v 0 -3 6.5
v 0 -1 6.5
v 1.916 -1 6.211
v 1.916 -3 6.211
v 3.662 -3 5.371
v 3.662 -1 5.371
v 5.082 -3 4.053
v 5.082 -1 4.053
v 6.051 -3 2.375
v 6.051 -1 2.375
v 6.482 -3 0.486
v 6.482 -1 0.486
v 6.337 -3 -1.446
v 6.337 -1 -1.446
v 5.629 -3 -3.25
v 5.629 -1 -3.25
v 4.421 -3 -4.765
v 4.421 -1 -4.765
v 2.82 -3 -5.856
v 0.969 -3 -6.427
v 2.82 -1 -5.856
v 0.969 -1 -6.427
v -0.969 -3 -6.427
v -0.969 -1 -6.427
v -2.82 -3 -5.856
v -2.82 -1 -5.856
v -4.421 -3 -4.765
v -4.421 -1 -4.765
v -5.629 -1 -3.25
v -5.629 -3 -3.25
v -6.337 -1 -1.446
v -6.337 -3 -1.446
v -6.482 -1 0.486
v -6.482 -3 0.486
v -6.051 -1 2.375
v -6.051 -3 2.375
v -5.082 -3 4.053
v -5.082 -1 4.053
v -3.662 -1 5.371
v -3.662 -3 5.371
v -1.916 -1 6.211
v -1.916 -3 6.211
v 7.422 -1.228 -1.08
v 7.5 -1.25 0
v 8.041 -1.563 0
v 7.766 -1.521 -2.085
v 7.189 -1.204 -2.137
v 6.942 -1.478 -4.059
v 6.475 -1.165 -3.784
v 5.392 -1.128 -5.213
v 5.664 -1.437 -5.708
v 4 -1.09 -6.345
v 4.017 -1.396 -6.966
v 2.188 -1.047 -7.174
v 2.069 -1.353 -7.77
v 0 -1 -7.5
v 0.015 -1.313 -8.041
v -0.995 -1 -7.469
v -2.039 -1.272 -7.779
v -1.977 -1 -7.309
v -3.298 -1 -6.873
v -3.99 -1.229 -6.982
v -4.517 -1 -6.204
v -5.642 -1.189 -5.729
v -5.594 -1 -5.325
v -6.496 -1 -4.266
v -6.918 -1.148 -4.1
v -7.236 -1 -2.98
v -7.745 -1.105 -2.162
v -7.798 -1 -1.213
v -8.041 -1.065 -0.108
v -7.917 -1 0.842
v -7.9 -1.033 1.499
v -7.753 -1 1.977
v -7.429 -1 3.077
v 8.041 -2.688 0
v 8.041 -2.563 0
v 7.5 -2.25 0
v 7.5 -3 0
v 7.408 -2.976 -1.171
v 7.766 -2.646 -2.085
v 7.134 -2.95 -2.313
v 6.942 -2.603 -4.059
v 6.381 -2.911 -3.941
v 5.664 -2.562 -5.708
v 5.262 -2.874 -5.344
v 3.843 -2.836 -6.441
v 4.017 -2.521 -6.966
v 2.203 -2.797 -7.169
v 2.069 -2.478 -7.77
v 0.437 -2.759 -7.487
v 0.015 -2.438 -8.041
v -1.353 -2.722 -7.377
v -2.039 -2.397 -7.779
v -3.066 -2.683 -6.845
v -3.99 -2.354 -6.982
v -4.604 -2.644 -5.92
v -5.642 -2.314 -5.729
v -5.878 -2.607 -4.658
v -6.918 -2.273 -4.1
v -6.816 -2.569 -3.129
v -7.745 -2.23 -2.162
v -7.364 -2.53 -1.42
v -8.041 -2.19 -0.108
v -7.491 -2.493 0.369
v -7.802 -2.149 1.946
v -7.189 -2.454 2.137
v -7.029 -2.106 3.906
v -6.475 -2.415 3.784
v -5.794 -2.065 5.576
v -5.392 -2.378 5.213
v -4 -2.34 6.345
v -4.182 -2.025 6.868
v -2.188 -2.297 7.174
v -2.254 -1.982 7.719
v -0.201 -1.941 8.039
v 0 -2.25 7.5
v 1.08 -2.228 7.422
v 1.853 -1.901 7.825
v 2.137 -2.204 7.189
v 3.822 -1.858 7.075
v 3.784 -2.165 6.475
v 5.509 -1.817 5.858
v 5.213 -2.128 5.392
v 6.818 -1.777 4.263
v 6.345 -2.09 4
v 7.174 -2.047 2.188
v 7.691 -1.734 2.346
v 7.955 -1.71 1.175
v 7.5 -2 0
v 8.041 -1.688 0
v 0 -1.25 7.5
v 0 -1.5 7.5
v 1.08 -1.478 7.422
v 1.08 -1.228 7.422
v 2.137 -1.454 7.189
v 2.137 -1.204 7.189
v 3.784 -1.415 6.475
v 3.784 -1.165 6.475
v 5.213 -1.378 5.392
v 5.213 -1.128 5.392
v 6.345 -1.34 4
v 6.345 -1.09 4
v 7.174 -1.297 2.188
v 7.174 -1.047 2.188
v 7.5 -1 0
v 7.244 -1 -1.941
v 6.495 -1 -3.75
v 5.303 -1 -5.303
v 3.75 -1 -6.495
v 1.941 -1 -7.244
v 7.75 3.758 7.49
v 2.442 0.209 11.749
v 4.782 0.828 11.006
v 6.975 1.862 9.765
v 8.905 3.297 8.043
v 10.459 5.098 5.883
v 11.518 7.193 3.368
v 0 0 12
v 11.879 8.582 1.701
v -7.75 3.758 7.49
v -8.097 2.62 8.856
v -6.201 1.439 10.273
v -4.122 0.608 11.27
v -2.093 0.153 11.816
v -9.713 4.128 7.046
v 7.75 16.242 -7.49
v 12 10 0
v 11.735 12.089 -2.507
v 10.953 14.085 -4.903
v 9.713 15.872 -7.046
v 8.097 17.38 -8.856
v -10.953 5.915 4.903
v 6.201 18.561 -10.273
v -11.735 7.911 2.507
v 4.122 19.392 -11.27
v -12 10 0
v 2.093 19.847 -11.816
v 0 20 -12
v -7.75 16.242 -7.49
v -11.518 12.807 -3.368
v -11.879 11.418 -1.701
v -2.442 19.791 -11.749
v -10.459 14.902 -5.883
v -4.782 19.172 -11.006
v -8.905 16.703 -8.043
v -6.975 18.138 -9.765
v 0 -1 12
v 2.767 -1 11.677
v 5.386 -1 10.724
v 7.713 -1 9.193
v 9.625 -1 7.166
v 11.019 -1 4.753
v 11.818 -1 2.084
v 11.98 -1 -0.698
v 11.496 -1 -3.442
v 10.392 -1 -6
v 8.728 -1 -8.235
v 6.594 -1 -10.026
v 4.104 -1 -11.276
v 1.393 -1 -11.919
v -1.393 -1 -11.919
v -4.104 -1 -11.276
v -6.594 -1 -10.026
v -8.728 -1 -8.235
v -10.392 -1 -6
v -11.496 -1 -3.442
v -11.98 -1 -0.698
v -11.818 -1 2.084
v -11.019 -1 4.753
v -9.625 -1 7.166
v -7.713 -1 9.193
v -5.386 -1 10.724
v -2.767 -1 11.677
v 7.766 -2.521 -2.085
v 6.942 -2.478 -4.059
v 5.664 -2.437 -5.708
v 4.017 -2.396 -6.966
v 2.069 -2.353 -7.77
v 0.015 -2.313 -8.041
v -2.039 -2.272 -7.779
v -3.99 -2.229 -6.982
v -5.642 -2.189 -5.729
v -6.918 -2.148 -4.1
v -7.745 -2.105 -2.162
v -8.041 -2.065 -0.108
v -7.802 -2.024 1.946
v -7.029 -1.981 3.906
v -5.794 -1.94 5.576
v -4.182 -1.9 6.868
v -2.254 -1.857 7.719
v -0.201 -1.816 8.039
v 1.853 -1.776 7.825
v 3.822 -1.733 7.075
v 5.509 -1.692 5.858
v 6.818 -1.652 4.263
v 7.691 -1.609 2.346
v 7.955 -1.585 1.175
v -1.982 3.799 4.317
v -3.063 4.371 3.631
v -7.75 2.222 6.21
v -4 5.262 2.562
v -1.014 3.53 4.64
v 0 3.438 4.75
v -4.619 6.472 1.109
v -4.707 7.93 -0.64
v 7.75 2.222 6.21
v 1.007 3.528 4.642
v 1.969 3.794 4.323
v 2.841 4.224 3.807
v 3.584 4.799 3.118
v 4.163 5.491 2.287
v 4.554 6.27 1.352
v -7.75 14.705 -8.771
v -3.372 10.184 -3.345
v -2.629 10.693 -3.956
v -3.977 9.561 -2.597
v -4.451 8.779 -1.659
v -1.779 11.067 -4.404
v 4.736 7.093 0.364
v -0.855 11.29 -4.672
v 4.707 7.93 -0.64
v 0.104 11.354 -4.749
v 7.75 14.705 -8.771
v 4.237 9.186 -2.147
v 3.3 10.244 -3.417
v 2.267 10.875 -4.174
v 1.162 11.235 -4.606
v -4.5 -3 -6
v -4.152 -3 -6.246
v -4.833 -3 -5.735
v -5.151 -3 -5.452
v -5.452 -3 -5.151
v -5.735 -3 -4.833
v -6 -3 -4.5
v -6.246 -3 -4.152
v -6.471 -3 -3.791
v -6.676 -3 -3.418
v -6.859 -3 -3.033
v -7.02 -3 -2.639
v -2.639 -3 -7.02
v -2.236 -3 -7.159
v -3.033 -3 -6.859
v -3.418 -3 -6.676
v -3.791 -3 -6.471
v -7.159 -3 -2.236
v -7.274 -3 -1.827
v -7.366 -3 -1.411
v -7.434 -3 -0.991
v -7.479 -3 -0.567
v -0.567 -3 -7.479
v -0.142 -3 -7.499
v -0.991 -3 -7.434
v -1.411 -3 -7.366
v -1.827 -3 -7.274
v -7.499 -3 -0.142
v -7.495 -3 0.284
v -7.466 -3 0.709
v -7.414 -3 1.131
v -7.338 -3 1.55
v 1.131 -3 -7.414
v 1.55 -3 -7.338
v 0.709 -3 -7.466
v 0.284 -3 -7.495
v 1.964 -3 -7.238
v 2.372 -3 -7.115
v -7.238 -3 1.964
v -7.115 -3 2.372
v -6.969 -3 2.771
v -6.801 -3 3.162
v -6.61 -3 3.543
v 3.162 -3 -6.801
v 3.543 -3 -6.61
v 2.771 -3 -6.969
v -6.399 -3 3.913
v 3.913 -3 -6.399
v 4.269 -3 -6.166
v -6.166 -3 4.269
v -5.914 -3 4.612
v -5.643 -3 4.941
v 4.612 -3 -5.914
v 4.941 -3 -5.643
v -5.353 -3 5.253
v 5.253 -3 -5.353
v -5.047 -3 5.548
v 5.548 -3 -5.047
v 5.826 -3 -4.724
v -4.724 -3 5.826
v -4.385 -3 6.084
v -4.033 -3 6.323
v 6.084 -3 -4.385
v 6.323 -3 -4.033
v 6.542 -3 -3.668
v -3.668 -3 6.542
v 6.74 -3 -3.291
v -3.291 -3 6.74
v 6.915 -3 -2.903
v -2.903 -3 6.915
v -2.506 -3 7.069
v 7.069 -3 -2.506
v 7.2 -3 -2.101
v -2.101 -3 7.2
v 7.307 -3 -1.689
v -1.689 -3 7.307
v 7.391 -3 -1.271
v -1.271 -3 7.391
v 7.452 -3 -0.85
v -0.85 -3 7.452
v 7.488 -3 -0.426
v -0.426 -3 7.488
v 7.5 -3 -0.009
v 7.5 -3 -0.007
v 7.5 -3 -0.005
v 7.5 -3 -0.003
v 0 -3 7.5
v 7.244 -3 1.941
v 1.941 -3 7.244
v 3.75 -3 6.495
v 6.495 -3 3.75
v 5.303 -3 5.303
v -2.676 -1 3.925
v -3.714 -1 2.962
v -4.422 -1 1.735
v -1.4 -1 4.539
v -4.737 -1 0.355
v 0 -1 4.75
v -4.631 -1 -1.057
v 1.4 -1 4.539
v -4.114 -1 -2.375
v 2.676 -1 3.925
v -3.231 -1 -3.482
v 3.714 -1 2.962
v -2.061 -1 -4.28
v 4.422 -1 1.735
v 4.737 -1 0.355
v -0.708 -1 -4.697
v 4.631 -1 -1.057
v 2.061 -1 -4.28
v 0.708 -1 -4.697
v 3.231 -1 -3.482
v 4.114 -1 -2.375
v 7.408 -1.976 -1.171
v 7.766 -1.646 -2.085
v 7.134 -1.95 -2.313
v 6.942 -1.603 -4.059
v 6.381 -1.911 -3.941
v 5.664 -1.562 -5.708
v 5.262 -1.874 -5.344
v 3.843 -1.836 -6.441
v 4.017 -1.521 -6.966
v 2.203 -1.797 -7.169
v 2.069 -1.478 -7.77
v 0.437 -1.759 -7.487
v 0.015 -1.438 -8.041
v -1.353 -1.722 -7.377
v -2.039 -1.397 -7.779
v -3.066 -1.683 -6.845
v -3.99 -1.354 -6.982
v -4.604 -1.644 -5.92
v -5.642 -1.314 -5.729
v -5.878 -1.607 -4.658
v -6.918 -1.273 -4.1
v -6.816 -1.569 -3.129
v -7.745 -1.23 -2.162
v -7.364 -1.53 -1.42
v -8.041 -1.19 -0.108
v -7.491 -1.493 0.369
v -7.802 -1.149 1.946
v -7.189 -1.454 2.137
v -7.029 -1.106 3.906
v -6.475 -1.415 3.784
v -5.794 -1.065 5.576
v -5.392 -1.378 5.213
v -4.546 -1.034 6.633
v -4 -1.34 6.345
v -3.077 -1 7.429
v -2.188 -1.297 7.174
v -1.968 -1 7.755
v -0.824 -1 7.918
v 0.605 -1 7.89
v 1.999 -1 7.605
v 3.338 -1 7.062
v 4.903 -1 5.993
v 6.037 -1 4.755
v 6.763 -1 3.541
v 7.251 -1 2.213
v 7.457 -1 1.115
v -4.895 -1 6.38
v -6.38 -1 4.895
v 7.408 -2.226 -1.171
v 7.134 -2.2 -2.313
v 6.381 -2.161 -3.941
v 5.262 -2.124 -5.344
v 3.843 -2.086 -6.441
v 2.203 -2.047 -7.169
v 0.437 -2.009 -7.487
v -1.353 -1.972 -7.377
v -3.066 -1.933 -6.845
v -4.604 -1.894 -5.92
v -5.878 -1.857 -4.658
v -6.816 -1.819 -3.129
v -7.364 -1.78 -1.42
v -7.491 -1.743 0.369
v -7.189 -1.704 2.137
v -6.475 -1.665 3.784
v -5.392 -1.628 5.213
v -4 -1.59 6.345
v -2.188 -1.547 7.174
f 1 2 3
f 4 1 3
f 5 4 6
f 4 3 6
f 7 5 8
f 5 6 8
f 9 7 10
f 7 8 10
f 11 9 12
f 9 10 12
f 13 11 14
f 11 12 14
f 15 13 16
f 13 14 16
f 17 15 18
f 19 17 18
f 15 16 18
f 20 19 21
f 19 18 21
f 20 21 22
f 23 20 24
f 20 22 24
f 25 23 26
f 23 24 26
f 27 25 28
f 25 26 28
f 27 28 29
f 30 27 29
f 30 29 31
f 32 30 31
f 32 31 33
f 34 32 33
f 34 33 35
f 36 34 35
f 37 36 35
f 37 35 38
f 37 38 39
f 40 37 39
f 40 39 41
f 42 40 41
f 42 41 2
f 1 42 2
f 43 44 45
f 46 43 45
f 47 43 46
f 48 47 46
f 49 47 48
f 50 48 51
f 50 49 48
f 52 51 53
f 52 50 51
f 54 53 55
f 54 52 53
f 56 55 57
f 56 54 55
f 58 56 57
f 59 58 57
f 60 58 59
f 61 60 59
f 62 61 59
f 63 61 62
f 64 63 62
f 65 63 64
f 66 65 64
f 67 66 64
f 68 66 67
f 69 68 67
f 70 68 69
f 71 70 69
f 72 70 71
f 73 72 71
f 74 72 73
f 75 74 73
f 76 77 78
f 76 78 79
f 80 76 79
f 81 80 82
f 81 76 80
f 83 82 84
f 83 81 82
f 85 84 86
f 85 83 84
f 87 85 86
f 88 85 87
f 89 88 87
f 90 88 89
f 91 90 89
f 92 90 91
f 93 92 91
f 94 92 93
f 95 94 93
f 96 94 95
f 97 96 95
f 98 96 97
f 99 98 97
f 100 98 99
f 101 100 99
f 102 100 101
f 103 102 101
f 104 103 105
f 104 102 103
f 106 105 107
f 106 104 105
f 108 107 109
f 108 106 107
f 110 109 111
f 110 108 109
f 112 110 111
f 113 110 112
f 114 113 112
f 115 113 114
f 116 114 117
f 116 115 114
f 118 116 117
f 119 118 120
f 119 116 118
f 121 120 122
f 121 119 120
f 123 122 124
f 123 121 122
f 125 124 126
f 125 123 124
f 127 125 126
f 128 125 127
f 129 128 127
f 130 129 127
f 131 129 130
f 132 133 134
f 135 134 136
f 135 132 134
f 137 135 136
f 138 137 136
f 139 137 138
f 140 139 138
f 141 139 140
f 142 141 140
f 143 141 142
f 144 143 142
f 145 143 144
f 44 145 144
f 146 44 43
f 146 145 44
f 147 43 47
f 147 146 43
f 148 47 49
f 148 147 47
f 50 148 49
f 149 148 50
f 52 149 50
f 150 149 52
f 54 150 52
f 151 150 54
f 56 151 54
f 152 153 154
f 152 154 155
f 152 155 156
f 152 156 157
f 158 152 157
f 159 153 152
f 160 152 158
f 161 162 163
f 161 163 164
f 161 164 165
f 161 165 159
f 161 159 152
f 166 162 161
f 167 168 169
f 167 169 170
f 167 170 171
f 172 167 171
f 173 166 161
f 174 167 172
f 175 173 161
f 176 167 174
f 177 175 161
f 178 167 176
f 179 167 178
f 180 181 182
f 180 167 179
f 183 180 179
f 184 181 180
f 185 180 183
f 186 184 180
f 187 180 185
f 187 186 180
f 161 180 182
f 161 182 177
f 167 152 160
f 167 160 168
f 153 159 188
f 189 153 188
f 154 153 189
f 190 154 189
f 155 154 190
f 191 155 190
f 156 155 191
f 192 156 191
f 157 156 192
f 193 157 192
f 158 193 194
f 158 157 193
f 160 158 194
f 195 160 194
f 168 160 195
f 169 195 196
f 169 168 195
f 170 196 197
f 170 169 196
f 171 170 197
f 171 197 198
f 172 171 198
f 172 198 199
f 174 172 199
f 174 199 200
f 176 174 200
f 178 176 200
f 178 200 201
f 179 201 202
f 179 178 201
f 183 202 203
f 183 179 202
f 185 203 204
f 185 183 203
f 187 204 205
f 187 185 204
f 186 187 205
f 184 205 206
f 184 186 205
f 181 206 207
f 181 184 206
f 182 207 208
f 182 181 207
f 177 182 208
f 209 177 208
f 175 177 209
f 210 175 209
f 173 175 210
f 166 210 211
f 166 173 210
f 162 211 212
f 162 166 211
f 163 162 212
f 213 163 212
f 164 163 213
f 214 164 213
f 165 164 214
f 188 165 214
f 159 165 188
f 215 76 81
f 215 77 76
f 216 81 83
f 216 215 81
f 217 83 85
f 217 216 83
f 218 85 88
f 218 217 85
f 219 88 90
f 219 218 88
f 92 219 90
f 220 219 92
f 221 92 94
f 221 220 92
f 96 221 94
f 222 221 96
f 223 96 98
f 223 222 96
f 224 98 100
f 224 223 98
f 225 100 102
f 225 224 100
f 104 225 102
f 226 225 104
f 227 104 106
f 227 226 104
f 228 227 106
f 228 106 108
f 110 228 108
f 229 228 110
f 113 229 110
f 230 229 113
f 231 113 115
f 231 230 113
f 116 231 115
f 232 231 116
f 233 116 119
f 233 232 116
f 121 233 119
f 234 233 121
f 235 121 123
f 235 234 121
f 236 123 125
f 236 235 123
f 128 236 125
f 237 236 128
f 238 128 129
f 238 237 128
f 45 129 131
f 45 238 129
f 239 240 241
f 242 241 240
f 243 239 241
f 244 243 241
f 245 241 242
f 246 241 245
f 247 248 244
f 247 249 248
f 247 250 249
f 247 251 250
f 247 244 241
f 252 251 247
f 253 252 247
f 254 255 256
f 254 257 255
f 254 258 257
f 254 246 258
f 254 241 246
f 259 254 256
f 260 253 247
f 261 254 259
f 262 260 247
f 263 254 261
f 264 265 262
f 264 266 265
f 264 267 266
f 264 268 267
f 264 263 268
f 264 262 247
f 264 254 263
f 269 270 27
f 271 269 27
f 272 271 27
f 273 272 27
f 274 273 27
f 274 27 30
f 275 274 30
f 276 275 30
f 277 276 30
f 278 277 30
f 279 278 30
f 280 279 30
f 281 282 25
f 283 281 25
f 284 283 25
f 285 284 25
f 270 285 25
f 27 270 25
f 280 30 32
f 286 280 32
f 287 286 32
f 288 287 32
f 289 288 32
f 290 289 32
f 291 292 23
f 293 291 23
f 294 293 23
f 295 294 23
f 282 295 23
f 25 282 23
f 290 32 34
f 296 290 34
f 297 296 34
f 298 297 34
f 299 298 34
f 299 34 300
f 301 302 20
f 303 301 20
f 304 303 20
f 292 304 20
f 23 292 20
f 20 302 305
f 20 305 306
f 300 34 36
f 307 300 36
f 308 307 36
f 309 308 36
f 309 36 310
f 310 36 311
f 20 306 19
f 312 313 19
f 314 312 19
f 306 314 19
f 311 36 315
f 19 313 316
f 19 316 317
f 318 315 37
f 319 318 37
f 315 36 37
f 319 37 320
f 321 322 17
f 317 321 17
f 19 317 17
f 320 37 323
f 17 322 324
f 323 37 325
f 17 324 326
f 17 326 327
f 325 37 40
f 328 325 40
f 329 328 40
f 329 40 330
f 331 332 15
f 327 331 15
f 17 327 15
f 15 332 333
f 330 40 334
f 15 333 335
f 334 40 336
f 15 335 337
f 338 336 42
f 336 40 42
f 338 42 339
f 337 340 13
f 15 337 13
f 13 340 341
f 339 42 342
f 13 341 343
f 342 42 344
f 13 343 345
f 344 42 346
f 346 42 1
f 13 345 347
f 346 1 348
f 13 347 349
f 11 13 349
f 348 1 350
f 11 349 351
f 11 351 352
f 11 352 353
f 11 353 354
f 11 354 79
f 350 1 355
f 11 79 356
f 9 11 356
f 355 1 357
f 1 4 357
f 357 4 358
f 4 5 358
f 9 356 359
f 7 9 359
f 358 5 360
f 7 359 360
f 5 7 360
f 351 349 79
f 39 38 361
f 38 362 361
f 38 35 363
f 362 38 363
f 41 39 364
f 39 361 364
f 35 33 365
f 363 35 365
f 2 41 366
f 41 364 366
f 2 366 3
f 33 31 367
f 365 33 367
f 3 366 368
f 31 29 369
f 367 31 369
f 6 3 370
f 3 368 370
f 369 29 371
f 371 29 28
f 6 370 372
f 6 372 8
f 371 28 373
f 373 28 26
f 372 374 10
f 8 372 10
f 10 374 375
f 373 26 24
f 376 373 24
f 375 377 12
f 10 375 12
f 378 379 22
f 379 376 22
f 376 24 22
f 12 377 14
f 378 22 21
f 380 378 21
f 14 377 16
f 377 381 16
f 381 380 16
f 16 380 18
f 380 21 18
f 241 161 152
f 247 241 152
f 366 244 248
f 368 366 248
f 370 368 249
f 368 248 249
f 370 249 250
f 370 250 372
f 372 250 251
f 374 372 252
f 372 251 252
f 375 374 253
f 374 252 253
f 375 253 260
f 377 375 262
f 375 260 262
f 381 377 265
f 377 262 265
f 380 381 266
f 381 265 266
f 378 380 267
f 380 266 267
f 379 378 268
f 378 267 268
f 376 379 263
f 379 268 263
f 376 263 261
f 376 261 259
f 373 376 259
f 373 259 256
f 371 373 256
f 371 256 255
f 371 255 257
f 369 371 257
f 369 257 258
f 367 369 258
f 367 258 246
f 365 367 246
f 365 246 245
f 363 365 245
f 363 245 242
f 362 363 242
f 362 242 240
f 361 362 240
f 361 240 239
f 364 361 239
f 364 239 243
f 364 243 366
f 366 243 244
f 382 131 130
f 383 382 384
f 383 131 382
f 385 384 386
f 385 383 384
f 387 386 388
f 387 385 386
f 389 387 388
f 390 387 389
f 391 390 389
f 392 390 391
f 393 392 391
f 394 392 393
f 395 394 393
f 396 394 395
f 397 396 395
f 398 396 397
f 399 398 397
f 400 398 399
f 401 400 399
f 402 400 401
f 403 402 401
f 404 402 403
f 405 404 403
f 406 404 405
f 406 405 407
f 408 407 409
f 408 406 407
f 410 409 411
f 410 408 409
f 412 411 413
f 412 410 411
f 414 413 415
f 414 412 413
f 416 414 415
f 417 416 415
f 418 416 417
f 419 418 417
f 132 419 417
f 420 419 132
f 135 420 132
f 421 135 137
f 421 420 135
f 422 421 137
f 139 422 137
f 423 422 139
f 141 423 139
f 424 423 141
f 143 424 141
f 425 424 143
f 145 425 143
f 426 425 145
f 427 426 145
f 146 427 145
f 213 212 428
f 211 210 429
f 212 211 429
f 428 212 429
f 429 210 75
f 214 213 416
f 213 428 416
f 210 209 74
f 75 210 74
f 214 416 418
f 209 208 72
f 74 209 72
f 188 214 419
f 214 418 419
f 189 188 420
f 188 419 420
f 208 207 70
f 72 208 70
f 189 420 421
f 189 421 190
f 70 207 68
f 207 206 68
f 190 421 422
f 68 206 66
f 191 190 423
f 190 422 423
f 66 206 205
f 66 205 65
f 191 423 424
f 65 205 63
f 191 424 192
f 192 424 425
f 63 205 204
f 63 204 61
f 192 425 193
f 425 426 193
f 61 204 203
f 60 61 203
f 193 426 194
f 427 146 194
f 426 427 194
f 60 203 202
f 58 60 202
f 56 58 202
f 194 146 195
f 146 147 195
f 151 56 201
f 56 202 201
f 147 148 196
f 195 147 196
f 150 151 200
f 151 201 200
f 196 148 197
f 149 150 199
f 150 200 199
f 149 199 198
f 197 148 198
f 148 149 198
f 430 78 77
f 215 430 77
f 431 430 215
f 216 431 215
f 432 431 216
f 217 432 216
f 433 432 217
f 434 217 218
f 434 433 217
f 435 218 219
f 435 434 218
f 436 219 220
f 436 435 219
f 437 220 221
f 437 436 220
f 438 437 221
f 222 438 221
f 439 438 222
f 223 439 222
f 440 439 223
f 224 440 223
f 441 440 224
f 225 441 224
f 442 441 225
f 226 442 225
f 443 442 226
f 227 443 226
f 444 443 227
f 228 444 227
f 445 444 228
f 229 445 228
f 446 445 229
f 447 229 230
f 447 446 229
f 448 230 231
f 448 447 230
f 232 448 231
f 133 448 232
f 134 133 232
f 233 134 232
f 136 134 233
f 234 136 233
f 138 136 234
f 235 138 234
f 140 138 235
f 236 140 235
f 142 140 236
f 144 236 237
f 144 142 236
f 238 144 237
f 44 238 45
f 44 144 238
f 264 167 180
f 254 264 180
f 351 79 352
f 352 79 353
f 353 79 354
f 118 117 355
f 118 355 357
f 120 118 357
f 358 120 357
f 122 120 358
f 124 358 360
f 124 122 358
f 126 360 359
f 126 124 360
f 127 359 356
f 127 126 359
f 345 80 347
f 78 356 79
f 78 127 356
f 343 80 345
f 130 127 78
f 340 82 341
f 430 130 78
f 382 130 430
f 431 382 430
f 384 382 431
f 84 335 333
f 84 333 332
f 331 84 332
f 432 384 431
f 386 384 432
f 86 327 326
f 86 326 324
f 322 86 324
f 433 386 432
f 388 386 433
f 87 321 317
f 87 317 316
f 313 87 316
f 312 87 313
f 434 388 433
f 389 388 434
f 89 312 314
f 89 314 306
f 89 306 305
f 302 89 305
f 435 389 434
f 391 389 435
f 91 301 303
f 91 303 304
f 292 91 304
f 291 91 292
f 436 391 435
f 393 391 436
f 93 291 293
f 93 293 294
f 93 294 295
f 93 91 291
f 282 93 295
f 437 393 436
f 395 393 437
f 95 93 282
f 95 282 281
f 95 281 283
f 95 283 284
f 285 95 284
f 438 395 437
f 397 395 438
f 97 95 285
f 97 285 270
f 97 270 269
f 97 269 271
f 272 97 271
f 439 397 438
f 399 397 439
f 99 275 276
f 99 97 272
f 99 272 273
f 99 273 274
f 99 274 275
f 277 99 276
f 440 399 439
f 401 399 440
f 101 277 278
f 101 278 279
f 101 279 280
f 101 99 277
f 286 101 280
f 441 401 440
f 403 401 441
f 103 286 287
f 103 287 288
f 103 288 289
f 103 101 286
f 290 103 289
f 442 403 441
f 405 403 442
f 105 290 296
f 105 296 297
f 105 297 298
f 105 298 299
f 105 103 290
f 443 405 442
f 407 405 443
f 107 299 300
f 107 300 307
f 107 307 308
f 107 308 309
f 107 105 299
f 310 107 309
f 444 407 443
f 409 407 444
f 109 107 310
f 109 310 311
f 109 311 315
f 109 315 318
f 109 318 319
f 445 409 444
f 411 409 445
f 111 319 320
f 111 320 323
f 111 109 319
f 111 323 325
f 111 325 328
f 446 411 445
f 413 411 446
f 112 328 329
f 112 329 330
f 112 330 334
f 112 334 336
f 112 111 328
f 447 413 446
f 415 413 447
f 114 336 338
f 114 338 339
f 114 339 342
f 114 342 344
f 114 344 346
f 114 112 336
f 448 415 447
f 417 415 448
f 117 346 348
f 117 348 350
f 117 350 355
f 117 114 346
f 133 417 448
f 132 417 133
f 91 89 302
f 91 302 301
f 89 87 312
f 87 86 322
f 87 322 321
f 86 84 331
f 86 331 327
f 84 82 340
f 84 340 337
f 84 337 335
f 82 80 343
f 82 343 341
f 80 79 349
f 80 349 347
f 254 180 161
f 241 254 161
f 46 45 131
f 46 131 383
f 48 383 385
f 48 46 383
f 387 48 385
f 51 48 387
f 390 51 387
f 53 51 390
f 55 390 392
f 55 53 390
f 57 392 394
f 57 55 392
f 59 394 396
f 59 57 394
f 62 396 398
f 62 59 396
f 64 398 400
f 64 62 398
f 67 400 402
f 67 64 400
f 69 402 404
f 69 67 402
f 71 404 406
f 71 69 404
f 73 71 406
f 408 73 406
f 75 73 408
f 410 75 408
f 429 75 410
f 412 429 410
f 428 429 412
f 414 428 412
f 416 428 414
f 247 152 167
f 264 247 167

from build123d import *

# Parameters (mm, degrees)
SKETCH2_R           = 12
SKETCH2_R_2         = 7.5
SKETCH2_R_3         = 6.5
SKETCH2_R_4         = 4.75
BOSS_EXTRUDE2_DEPTH = 1
SKETCH2_4_R         = 7.5
SKETCH2_4_R_2       = 6.5
BOSS_EXTRUDE3_DEPTH = 3
BOSS_EXTRUDE4_START = 20
SKETCH2_5_R         = 12
SKETCH2_5_R_2       = 4.75
BOSS_EXTRUDE4_DEPTH = 20
CUT_EXTRUDE1_START  = -12.0000001
CUT_EXTRUDE1_DEPTH  = 24.0000001
CUT_EXTRUDE5_DEPTH  = 2
SKETCH11_W          = 15.5
SKETCH11_H          = 2
CUT_EXTRUDE6_DEPTH  = 18
THREAD2_PITCH       = 1


# Read off the part's stored shape, not the designer's step: Cut-Extrude1
with BuildPart() as part:
    # Sketch2 → Boss-Extrude2 (new body)
    # profile 1 of 3: a face of its own
    with BuildSketch(Plane(origin=(0, 0, 0), x_dir=(1, 0, 0), z_dir=(0, 1, 0))):
        with Locations(Location((0, 0, 0), (0, 0, 270))):
            Circle(SKETCH2_R)
        Circle(SKETCH2_R_2, mode=Mode.SUBTRACT)
    # profile 2 of 3: a face of its own
    with BuildSketch(Plane(origin=(0, 0, 0), x_dir=(1, 0, 0), z_dir=(0, 1, 0))):
        Circle(SKETCH2_R_2)
        Circle(SKETCH2_R_3, mode=Mode.SUBTRACT)
    # profile 3 of 3: a face of its own
    with BuildSketch(Plane(origin=(0, 0, 0), x_dir=(1, 0, 0), z_dir=(0, 1, 0))):
        Circle(SKETCH2_R_3)
        with Locations(Location((0, 0, 0), (0, 0, 270))):
            Circle(SKETCH2_R_4, mode=Mode.SUBTRACT)
    extrude(amount=-BOSS_EXTRUDE2_DEPTH)

    # Sketch2<4> → Boss-Extrude3 (add)
    with BuildSketch(Plane(origin=(0, 0, 0), x_dir=(1, 0, 0), z_dir=(0, 1, 0))):
        with Locations(Location((0, 0, 0), (0, 0, 270))):
            Circle(SKETCH2_4_R)
        with Locations(Location((0, 0, 0), (0, 0, 270))):
            Circle(SKETCH2_4_R_2, mode=Mode.SUBTRACT)
    extrude(amount=-BOSS_EXTRUDE3_DEPTH)

    # Sketch2<5> → Boss-Extrude4 (add)
    with BuildSketch(Plane(origin=(0, 0, 0), x_dir=(1, 0, 0), z_dir=(0, 1, 0)).offset(BOSS_EXTRUDE4_START)):
        with Locations(Location((0, 0, 0), (0, 0, 270))):
            Circle(SKETCH2_5_R)
        with Locations(Location((0, 0, 0), (0, 0, 270))):
            Circle(SKETCH2_5_R_2, mode=Mode.SUBTRACT)
    extrude(amount=-BOSS_EXTRUDE4_DEPTH)

    # Cut-Extrude1 outline → Cut-Extrude1 (cut)
    with BuildSketch(Plane(origin=(0, 0, 0), x_dir=(0, 0, -1), z_dir=(1, 0, 0)).offset(CUT_EXTRUDE1_START)):
        Polygon((-12, 20), (-12, 0), (12, 20), align=None)
    extrude(amount=CUT_EXTRUDE1_DEPTH, mode=Mode.SUBTRACT)

    # Sketch10 → Cut-Extrude5 (cut)
    with BuildSketch(Plane(origin=(0, 5.901639344, 4.918032787), x_dir=(1, 0, 0), z_dir=(0, 0.768221279597376, 0.6401843996644798))):
        with BuildLine():
            Line((-4.75, 6.401843997), (-7.75, 6.401843997))
            Line((-7.75, 6.401843997), (-7.75, -3.348156003))
            Line((-7.75, -3.348156003), (7.75, -3.348156003))
            Line((7.75, -3.348156003), (7.75, 6.401843997))
            Line((7.75, 6.401843997), (4.75, 6.401843997))
            add(Edge.make_bspline(
                [(-4.75, 6.401843997), (-4.75, 0.21872967), (0, 0.21872967), (4.75, 0.21872967), (4.75, 6.401843997)],
                knots=[1.570796327, 1.570796327, 1.570796327, 3.141592654, 3.141592654, 4.71238898, 4.71238898, 4.71238898], degree=2, weights=[1, 0.707106781, 1, 0.707106781, 1]))
        make_face()
        with BuildLine():
            Line((-7.75, 16.151843997), (-7.75, 6.401843997))
            Line((-7.75, 6.401843997), (-4.75, 6.401843997))
            add(Edge.make_bspline(
                [(0, 12.584958323), (-4.75, 12.584958323), (-4.75, 6.401843997)],
                knots=[0, 0, 0, 1.570796327, 1.570796327, 1.570796327], degree=2, weights=[1, 0.707106781, 1]))
            add(Edge.make_bspline(
                [(4.75, 6.401843997), (4.75, 12.584958323), (0, 12.584958323)],
                knots=[4.71238898, 4.71238898, 4.71238898, 6.283185307, 6.283185307, 6.283185307], degree=2, weights=[1, 0.707106781, 1]))
            Line((4.75, 6.401843997), (7.75, 6.401843997))
            Line((7.75, 6.401843997), (7.75, 16.151843997))
            Line((7.75, 16.151843997), (-7.75, 16.151843997))
        make_face()
    extrude(amount=-CUT_EXTRUDE5_DEPTH, mode=Mode.SUBTRACT)

    # Sketch11 → Cut-Extrude6 (cut)
    with BuildSketch(Plane(origin=(0, -2.143437241, 2.572124689), x_dir=(-1, 0, 0), z_dir=(0, 0.6401843996644799, -0.7682212795973757))):
        with Locations((0, 6.682212796)):
            Rectangle(SKETCH11_W, SKETCH11_H)
    extrude(amount=CUT_EXTRUDE6_DEPTH, mode=Mode.SUBTRACT)

    # Thread2: the profile of Thread Profile2 profile screwed along a right-hand helix of 2 turns, 8 arcs to a turn; built about Z, then put on its axis
    thread2_z = Axis((0, 0, 0), (0, 0, 1))
    thread2_corners = [(7.4997, 0, -0.000173205), (8.041265875, 0, 0.312499999), (8.041265875, 0, 0.437499999), (7.4997, 0, 0.750173202)]
    with BuildLine(mode=Mode.PRIVATE) as thread2_profile:
        Line(thread2_corners[0], thread2_corners[1])
        Line(thread2_corners[1], thread2_corners[2])
        Line(thread2_corners[2], thread2_corners[3])
        Line(thread2_corners[3], thread2_corners[0])
    thread2_cap = Face(thread2_profile.wire())
    thread2_turn_angles = [0, 22.5, 45, 67.5, 90, 112.5, 135, 157.5, 180, 202.5, 225, 247.5, 270, 292.5, 315, 337.5, 360]
    thread2_turn_weights = [1, 0.9238795325112867, 1, 0.9238795325112867, 1, 0.9238795325112867, 1, 0.9238795325112867, 1, 0.9238795325112867, 1, 0.9238795325112867, 1, 0.9238795325112867, 1, 0.9238795325112867, 1]
    thread2_turn_rails = [Edge.make_bspline([Vector(p[0], p[1], 0).rotate(thread2_z, thread2_turn_angles[k]) / thread2_turn_weights[k] + Vector(0, 0, p[2] + THREAD2_PITCH * thread2_turn_angles[k] / 360) for k in range(17)], [0, 0, 0, 1, 1, 2, 2, 3, 3, 4, 4, 5, 5, 6, 6, 7, 7, 8, 8, 8], 2, thread2_turn_weights) for p in thread2_corners]
    thread2_turn_sides = [Face.make_surface_from_curves(thread2_turn_rails[p[0]], thread2_turn_rails[p[1]]) for p in [(0, 1), (1, 2), (2, 3), (3, 0)]]
    thread2 = Plane(origin=(0, -3, 0), x_dir=(1, 0, 0), z_dir=(0, 1, 0)) * Solid(Shell([*[p.moved(Location((0, 0, THREAD2_PITCH * i))) for i in range(2) for p in thread2_turn_sides], thread2_cap, thread2_cap.rotate(thread2_z, 720).moved(Location((0, 0, THREAD2_PITCH * 720 / 360)))]))
    add(thread2)


solid = part.part
